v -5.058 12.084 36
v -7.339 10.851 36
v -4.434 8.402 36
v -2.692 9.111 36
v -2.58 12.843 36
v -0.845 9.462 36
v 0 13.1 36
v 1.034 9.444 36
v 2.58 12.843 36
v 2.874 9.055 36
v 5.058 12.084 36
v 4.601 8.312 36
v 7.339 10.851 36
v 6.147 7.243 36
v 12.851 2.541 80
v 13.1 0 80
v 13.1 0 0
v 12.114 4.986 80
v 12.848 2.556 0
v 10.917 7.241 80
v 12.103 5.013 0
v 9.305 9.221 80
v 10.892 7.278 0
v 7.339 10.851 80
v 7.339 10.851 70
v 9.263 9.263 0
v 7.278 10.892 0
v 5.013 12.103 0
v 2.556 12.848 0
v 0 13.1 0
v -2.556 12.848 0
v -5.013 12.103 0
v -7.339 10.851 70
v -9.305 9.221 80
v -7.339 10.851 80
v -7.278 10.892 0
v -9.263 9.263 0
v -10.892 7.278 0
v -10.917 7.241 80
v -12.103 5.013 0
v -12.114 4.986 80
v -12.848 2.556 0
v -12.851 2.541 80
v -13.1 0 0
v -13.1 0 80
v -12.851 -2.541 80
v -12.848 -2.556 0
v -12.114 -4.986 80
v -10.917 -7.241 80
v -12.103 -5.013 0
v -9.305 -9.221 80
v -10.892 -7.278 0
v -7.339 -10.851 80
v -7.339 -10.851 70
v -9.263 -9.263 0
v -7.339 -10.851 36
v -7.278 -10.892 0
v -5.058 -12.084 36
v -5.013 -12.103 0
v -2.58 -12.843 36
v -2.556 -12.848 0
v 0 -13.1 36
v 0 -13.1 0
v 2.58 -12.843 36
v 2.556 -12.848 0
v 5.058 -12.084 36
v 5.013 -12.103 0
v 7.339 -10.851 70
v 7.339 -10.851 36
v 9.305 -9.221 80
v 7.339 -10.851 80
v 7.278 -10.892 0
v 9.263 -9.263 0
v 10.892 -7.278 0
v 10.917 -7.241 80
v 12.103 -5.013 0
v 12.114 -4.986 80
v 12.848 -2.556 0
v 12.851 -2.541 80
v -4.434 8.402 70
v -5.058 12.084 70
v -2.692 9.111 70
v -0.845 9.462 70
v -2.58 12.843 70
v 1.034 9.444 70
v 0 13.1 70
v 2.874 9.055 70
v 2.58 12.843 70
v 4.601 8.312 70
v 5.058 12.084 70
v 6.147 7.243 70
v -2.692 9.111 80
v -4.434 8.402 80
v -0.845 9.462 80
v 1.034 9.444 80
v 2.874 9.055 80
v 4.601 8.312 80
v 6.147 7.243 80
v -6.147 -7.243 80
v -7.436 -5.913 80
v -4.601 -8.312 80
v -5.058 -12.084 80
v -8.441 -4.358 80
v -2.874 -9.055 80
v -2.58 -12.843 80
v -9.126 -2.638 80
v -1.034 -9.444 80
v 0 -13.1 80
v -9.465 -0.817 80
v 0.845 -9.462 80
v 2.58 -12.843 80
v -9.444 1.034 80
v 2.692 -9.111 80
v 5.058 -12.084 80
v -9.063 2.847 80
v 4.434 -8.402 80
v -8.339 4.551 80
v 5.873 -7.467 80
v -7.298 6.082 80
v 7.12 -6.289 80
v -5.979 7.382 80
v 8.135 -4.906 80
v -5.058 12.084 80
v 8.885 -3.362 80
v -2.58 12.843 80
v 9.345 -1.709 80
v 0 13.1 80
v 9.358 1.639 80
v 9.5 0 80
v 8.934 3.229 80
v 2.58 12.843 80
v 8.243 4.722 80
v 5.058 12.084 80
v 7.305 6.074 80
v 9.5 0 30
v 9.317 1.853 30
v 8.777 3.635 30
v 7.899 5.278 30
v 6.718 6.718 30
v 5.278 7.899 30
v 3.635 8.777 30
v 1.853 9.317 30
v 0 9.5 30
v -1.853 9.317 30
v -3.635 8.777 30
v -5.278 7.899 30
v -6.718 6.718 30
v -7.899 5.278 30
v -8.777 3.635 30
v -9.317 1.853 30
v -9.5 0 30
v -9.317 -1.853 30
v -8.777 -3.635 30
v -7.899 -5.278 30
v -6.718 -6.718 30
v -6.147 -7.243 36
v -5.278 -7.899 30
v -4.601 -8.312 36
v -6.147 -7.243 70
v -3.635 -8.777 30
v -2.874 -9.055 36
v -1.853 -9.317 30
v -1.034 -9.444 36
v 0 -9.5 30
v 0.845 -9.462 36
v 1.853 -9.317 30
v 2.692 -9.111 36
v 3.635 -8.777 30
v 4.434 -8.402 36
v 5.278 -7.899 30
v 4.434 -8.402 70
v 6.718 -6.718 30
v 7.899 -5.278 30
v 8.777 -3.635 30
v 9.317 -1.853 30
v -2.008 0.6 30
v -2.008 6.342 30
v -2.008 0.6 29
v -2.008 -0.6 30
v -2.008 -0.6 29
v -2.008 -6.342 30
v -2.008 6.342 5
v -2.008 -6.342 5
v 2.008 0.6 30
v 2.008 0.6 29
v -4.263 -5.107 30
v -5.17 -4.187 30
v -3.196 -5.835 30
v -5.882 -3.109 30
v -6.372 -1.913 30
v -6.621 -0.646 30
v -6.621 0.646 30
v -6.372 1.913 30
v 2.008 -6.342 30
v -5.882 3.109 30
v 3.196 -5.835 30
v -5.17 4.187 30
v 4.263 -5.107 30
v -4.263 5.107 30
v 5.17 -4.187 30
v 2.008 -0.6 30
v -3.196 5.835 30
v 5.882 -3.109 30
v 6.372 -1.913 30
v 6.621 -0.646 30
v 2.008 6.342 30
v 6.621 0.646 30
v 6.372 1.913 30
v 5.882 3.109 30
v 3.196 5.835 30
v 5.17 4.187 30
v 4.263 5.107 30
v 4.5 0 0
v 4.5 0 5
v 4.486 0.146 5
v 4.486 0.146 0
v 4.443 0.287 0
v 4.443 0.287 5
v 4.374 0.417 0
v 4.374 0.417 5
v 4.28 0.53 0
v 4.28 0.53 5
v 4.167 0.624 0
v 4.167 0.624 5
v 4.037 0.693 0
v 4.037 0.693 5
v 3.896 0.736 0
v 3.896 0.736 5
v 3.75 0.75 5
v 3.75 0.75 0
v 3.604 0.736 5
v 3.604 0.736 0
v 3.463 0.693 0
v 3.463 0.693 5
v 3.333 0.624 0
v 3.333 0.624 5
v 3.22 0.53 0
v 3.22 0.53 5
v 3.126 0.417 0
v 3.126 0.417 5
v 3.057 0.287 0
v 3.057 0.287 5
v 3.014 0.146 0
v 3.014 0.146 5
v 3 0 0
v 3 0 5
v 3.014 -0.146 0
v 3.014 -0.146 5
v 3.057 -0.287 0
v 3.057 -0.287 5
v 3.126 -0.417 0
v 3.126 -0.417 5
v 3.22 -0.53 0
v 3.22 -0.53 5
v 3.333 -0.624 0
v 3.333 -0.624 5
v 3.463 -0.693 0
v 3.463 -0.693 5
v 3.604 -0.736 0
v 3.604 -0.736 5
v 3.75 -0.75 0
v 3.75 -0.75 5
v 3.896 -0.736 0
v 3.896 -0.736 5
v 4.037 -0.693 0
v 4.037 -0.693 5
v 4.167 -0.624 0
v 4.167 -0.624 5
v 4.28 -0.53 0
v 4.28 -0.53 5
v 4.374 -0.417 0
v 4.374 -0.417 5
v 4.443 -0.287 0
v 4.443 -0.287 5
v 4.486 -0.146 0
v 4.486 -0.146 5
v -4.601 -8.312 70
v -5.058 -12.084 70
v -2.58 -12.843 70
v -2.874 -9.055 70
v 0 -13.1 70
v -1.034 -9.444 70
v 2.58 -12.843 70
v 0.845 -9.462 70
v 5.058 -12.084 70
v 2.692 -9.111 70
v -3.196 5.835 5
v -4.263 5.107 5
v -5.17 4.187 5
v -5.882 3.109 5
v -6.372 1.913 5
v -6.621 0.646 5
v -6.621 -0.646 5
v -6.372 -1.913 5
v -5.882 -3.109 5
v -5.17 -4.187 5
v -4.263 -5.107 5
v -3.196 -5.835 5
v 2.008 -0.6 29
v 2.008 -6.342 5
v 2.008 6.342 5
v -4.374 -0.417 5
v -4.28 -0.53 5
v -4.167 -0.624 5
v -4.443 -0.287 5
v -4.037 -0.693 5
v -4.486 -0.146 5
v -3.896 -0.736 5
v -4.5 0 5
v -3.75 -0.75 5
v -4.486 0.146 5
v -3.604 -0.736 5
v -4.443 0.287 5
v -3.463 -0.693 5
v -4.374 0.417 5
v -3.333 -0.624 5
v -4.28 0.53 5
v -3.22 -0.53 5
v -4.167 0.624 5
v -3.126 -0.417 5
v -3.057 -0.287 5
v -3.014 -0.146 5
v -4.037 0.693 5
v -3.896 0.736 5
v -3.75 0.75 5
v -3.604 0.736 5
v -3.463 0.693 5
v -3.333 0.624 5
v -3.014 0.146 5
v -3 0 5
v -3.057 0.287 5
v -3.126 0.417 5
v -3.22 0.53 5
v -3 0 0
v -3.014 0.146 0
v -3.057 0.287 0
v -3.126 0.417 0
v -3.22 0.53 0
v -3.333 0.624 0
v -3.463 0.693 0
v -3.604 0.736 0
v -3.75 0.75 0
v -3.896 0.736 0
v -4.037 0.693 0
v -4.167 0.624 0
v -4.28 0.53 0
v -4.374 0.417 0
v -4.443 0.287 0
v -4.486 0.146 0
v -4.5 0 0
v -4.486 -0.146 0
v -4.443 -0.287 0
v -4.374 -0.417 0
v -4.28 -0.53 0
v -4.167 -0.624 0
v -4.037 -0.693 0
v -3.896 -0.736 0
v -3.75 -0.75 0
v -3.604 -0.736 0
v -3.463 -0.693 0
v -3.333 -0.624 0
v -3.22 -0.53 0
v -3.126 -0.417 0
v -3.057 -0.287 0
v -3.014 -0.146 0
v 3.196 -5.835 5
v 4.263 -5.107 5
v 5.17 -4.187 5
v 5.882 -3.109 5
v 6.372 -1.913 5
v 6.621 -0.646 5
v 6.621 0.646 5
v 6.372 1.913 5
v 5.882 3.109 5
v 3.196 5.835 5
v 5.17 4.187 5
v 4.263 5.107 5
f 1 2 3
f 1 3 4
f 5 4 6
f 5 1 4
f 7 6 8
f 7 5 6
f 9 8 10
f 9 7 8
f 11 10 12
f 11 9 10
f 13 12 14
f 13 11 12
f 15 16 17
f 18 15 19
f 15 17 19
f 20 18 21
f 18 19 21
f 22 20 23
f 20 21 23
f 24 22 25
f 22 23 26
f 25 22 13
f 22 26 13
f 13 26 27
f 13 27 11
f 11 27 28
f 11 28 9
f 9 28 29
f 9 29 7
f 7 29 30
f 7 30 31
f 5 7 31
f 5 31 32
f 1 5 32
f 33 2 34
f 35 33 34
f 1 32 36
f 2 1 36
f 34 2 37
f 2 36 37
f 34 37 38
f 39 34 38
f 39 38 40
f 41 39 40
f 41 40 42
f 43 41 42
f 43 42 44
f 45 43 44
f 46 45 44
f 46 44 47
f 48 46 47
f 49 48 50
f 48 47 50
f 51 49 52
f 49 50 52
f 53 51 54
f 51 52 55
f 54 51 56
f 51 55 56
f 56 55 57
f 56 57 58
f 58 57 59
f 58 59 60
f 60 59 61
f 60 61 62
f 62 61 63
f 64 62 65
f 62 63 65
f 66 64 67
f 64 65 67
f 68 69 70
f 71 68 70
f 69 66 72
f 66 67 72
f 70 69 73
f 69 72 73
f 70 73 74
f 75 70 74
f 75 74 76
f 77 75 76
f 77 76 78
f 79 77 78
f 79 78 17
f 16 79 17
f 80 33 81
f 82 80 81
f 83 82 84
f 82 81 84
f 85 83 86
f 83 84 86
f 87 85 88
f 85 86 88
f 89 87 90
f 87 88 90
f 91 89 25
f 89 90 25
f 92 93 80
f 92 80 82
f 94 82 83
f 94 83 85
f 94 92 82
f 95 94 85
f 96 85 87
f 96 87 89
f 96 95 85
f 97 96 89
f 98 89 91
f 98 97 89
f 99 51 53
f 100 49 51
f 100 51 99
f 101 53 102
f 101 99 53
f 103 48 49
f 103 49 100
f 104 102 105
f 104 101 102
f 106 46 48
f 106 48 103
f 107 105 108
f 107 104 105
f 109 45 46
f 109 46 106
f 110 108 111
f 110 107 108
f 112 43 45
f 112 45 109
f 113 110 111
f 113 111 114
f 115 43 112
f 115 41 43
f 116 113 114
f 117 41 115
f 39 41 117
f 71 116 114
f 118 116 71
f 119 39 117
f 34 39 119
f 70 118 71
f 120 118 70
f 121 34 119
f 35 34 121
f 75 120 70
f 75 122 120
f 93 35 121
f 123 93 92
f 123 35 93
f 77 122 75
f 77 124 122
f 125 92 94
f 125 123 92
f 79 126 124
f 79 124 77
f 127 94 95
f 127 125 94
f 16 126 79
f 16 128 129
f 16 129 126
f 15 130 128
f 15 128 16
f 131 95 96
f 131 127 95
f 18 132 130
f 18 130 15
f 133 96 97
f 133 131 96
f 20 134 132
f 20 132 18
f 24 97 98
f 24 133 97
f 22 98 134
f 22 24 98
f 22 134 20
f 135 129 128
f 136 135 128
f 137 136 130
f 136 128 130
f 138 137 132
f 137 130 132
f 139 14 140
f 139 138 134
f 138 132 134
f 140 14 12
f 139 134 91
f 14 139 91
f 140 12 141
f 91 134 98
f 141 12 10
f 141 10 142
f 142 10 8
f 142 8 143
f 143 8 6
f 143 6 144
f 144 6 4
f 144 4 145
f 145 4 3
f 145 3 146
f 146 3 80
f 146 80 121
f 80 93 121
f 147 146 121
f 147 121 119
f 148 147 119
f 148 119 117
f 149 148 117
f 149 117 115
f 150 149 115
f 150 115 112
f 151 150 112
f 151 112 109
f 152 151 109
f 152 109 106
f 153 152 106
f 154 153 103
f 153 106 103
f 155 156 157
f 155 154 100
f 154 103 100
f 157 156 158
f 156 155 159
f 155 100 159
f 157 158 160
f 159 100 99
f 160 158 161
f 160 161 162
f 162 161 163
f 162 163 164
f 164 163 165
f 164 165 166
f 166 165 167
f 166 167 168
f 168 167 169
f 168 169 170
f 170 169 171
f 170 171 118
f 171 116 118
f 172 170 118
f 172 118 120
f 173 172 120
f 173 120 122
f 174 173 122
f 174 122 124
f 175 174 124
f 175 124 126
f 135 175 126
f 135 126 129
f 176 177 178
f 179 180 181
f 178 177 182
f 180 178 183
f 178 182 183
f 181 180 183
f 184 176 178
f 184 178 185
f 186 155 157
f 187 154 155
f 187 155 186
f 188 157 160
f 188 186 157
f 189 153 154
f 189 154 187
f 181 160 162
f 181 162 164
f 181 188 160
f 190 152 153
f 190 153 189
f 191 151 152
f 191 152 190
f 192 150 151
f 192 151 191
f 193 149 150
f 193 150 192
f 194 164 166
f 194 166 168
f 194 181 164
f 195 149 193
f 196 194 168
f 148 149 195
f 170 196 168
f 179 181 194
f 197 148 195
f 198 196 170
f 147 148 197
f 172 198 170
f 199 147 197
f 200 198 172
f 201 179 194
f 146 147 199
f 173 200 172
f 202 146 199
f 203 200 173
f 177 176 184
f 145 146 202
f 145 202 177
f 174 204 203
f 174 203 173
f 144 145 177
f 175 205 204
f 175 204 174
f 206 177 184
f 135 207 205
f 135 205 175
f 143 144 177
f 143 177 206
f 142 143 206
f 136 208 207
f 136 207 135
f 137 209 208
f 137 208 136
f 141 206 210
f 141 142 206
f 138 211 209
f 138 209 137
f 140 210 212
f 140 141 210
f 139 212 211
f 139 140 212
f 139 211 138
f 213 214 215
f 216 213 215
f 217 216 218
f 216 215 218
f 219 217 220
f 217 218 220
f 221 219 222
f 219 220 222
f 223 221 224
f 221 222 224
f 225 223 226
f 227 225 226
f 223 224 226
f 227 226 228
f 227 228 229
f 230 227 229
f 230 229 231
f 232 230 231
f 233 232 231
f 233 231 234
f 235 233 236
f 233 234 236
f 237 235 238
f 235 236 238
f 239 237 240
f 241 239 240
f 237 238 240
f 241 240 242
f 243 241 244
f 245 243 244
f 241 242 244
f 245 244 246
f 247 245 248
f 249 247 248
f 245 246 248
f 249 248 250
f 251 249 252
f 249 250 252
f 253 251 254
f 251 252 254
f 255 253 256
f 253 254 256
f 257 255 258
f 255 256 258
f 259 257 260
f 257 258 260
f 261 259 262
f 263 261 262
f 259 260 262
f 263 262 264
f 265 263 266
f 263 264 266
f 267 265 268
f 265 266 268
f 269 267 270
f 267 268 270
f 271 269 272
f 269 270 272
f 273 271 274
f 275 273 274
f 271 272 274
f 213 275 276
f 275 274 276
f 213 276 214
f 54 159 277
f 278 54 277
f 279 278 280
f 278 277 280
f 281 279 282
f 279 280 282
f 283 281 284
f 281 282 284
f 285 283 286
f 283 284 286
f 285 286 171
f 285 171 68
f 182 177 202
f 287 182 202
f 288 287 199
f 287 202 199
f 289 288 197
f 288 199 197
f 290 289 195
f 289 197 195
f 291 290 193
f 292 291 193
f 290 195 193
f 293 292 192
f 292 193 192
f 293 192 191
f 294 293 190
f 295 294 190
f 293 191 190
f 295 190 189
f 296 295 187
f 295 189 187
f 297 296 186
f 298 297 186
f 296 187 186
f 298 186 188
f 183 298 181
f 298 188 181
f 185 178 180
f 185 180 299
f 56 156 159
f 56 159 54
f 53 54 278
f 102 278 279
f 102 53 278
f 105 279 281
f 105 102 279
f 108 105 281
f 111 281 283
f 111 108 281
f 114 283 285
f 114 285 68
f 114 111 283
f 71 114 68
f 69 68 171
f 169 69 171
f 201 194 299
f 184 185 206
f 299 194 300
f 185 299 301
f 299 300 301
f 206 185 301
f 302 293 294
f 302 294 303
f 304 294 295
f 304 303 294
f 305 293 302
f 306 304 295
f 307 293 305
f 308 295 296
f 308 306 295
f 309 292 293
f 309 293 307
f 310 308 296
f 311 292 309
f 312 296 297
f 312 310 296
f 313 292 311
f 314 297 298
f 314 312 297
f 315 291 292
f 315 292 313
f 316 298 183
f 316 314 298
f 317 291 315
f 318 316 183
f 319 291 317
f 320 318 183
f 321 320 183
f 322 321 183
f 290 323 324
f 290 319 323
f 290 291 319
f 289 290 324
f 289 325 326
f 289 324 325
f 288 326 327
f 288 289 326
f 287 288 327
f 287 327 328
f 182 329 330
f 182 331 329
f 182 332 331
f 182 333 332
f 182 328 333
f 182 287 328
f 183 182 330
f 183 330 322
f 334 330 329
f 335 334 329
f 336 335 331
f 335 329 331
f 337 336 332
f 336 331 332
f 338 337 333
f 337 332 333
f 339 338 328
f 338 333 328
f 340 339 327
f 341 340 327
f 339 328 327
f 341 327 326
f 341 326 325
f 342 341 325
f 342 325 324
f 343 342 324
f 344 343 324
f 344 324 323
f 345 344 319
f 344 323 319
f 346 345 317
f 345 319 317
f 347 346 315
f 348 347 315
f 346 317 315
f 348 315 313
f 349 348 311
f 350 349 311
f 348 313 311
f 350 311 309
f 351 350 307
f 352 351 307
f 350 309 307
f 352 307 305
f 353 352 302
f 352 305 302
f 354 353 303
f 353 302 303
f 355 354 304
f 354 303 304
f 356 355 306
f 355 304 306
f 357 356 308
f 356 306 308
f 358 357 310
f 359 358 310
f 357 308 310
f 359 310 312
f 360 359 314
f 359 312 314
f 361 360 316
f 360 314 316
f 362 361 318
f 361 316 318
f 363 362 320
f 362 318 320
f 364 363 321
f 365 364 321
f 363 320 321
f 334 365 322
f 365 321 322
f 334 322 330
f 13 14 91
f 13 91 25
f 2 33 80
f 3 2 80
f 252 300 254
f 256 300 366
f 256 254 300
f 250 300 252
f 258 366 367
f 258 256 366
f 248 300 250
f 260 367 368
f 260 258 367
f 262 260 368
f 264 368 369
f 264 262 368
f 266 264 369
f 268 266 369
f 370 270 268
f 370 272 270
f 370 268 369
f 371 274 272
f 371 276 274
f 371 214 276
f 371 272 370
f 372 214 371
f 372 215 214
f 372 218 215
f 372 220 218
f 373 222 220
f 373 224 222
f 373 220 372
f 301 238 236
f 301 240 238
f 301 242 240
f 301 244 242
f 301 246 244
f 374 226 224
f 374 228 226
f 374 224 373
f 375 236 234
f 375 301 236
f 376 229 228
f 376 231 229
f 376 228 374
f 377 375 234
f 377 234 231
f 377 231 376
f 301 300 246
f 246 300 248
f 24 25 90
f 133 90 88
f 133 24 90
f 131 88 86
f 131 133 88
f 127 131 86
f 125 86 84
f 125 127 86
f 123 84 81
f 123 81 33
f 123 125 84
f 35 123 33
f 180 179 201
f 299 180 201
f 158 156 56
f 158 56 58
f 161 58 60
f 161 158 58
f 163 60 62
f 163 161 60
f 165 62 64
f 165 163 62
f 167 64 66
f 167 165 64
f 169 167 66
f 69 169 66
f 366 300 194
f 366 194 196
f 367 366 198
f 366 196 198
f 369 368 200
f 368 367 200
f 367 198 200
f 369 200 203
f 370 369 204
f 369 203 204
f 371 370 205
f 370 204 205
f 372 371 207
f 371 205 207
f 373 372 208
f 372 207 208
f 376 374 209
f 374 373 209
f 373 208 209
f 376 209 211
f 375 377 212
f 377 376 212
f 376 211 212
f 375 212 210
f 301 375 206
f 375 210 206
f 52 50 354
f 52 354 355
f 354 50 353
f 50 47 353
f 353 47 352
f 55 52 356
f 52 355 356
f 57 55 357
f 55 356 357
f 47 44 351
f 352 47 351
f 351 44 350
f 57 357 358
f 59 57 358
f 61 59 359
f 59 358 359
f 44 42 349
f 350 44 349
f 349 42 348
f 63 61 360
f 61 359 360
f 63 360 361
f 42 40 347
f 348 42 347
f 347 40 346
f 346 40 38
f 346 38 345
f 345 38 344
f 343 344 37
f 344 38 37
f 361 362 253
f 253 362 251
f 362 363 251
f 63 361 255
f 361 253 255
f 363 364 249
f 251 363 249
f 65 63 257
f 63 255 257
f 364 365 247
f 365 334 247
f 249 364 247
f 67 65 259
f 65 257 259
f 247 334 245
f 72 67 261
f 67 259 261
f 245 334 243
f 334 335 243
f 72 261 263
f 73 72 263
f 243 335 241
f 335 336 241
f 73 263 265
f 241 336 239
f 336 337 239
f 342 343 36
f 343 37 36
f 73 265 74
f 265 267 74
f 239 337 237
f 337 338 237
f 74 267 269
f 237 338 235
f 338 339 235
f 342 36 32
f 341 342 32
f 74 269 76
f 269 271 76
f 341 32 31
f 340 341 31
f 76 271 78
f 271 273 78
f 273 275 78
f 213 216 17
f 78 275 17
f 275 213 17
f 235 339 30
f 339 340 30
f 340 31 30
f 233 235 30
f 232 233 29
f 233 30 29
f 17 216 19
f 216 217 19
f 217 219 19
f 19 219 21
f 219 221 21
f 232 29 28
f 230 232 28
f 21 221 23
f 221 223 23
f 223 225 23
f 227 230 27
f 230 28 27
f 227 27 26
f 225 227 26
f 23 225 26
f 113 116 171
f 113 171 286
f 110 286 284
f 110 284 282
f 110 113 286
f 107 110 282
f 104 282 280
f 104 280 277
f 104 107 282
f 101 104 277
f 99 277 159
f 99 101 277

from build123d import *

# Parameters (mm, degrees)
F0_R      = 13.1
F1_DEPTH  = 80
F2_R      = 9.5
F3_DEPTH  = 50
F4_R      = 6.6526235809
F5_DEPTH  = 25
F7_DEPTH  = 25
F8_R      = 0.75
F9_DEPTH  = 5
F10_W     = 4.01619326
F10_H     = 1.2
F11_DEPTH = 1
F13_DEPTH = 44
F14_DEPTH = 44
F15_DEPTH = 10
F16_DEPTH = 10


with BuildPart() as f1:
    # F0 (on Top) → F1 (new body)
    with BuildSketch(Plane.XY):
        Circle(F0_R)
    extrude(amount=F1_DEPTH)

    # F2 (on face) → F3 (cut)
    with BuildSketch(Plane.XY.offset(80)):
        Circle(F2_R)
    extrude(amount=-F3_DEPTH, mode=Mode.SUBTRACT)

    # F4 (on face) → F5 (cut)
    with BuildSketch(Plane.XY.offset(30)):
        Circle(F4_R)
    extrude(amount=-F5_DEPTH, mode=Mode.SUBTRACT)

    # F6 (on face) → F7 (join)
    with BuildSketch(Plane.XY.offset(5)):
        with BuildLine():
            ThreePointArc((2.00809663, 6.3423141229), (0, 6.6526235809), (-2.00809663, 6.3423141229))
            Line((-2.00809663, 6.3423141229), (-2.00809663, -6.3423141229))
            ThreePointArc((-2.00809663, -6.3423141229), (0, -6.6526235809), (2.00809663, -6.3423141229))
            Line((2.00809663, -6.3423141229), (2.00809663, 6.3423141229))
        make_face()
    extrude(amount=F7_DEPTH)

    # F8 (on face) → F9 (cut)
    with BuildSketch(Plane.XY.offset(5)):
        with Locations((-3.75, 0)):
            Circle(F8_R)
        with Locations((3.75, 0)):
            Circle(F8_R)
    extrude(amount=-F9_DEPTH, mode=Mode.SUBTRACT)

    # F10 (on face) → F11 (cut)
    with BuildSketch(Plane.XY.offset(30)):
        Rectangle(F10_W, F10_H)
    extrude(amount=-F11_DEPTH, mode=Mode.SUBTRACT)

    # F12 (on face) → F13 (cut)
    with BuildSketch(Plane.XY.offset(80)):
        with BuildLine():
            Line((-7.3388648552, 10.8513161708), (-4.4335485277, 8.4020025859))
            ThreePointArc((-4.4335485277, 8.4020025859), (1.034452264, 9.4435114504), (6.1473147231, 7.2429635989))
            Line((6.1473147231, 7.2429635989), (7.3388648552, 10.8513161708))
            ThreePointArc((7.3388648552, 10.8513161708), (0, 13.1), (-7.3388648552, 10.8513161708))
        make_face()
    extrude(amount=-F13_DEPTH, mode=Mode.SUBTRACT)

    # F12 (on face) → F14 (cut)
    with BuildSketch(Plane.XY.offset(80)):
        with BuildLine():
            ThreePointArc((4.4335485277, -8.4020025859), (-1.034452264, -9.4435114504), (-6.1473147231, -7.2429635989))
            Line((-6.1473147231, -7.2429635989), (-7.3388648552, -10.8513161708))
            ThreePointArc((-7.3388648552, -10.8513161708), (0, -13.1), (7.3388648552, -10.8513161708))
            Line((7.3388648552, -10.8513161708), (4.4335485277, -8.4020025859))
        make_face()
    extrude(amount=-F14_DEPTH, mode=Mode.SUBTRACT)

    # F12 (on face) → F15 (join)
    with BuildSketch(Plane.XY.offset(80)):
        with BuildLine():
            ThreePointArc((4.4335485277, -8.4020025859), (-1.034452264, -9.4435114504), (-6.1473147231, -7.2429635989))
            Line((-6.1473147231, -7.2429635989), (-7.3388648552, -10.8513161708))
            ThreePointArc((-7.3388648552, -10.8513161708), (0, -13.1), (7.3388648552, -10.8513161708))
            Line((7.3388648552, -10.8513161708), (4.4335485277, -8.4020025859))
        make_face()
    extrude(amount=-F15_DEPTH)

    # F12 (on face) → F16 (join)
    with BuildSketch(Plane.XY.offset(80)):
        with BuildLine():
            Line((-7.3388648552, 10.8513161708), (-4.4335485277, 8.4020025859))
            ThreePointArc((-4.4335485277, 8.4020025859), (1.034452264, 9.4435114504), (6.1473147231, 7.2429635989))
            Line((6.1473147231, 7.2429635989), (7.3388648552, 10.8513161708))
            ThreePointArc((7.3388648552, 10.8513161708), (0, 13.1), (-7.3388648552, 10.8513161708))
        make_face()
    extrude(amount=-F16_DEPTH)


solid = f1.part
